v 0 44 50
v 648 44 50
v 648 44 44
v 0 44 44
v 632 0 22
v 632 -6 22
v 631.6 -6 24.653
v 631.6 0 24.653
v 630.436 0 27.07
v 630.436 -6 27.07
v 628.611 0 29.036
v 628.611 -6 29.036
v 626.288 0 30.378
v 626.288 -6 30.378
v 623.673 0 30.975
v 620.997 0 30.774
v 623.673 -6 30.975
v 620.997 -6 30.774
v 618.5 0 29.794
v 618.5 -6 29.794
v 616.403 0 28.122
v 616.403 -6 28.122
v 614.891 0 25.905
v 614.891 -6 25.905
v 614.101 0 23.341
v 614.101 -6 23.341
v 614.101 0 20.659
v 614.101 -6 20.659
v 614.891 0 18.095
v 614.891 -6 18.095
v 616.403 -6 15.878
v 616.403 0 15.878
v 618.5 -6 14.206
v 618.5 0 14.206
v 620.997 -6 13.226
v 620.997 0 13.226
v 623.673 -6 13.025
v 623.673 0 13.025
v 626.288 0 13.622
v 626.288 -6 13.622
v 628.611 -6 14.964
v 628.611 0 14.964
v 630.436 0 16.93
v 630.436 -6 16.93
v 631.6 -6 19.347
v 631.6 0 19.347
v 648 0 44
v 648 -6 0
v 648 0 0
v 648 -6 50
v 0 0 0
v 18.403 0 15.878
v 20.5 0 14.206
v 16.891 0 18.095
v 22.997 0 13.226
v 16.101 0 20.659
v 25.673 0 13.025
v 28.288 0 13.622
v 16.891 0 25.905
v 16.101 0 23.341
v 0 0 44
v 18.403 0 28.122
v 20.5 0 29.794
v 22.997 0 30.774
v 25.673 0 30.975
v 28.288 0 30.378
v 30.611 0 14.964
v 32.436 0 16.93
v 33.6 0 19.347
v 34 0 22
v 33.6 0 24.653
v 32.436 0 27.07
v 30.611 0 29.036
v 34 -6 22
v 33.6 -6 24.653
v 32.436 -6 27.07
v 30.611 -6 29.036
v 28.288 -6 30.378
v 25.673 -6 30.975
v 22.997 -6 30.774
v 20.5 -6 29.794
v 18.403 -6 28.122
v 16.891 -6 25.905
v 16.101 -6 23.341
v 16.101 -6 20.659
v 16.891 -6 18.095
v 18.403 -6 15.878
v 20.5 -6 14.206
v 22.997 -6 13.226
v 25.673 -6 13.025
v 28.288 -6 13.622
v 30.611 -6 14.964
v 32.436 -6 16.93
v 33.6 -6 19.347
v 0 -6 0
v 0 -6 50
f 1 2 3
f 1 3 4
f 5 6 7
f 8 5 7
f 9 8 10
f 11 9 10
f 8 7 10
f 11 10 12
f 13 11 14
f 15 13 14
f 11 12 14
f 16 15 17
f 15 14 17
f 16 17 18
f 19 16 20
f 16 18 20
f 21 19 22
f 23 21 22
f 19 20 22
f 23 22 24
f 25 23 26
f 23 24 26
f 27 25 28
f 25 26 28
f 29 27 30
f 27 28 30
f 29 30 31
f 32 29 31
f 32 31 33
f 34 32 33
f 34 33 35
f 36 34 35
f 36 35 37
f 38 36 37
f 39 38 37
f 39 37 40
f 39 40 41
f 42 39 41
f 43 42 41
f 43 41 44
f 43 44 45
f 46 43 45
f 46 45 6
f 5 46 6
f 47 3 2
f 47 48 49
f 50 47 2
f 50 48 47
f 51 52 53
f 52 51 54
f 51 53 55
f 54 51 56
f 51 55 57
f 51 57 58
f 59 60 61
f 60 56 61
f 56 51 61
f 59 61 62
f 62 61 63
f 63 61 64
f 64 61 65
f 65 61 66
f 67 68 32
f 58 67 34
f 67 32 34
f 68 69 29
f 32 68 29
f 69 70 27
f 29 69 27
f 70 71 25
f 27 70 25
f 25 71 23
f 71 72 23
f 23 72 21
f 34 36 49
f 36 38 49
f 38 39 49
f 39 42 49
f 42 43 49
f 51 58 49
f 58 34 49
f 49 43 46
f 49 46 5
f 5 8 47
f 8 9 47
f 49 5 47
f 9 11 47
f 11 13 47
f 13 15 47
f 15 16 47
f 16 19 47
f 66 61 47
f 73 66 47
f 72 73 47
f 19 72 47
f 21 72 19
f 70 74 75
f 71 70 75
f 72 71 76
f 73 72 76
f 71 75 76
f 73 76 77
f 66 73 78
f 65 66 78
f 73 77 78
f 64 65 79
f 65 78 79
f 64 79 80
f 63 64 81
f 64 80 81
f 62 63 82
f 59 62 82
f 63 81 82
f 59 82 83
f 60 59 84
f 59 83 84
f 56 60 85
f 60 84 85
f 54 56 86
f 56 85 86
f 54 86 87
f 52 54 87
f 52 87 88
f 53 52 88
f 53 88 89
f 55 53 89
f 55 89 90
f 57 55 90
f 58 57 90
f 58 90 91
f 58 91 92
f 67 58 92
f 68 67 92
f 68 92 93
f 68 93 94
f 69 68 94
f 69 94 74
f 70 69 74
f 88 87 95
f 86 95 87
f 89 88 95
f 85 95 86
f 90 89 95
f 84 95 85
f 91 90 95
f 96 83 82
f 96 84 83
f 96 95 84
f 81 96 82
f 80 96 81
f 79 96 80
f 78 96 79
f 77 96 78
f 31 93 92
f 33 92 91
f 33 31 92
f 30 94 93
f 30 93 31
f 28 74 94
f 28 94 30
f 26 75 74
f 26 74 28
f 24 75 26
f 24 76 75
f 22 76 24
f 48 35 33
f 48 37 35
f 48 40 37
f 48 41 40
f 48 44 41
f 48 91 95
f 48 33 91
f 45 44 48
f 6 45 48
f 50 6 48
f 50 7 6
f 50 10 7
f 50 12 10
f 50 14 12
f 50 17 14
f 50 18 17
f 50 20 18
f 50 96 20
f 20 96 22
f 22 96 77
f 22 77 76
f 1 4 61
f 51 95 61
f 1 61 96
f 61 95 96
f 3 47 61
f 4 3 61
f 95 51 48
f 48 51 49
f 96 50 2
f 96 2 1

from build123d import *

# Parameters (mm, degrees)
F0_W     = 648
F0_H     = 50
F1_DEPTH = 6
F2_W     = 648
F2_H     = 6
F3_DEPTH = 44
F4_R     = 9
F5_DEPTH = 50.001


with BuildPart() as f1:
    # F0 (on Front) → F1 (new body)
    with BuildSketch(Plane.XZ):
        with Locations((324, 25)):
            Rectangle(F0_W, F0_H)
    extrude(amount=F1_DEPTH)

    # F2 (on face) → F3 (join)
    with BuildSketch(Plane(origin=(0, 0, 0), x_dir=(-1, 0, 0), z_dir=(0, 1, 0))):
        with Locations((-324, 47)):
            Rectangle(F2_W, F2_H)
    extrude(amount=F3_DEPTH)

    # F4 (on face) → F5 (cut, through all)
    with BuildSketch(Plane.XZ.offset(6)):
        with Locations((25, 22)):
            Circle(F4_R)
        with Locations((623, 22)):
            Circle(F4_R)
    extrude(amount=-F5_DEPTH, mode=Mode.SUBTRACT)


solid = f1.part
